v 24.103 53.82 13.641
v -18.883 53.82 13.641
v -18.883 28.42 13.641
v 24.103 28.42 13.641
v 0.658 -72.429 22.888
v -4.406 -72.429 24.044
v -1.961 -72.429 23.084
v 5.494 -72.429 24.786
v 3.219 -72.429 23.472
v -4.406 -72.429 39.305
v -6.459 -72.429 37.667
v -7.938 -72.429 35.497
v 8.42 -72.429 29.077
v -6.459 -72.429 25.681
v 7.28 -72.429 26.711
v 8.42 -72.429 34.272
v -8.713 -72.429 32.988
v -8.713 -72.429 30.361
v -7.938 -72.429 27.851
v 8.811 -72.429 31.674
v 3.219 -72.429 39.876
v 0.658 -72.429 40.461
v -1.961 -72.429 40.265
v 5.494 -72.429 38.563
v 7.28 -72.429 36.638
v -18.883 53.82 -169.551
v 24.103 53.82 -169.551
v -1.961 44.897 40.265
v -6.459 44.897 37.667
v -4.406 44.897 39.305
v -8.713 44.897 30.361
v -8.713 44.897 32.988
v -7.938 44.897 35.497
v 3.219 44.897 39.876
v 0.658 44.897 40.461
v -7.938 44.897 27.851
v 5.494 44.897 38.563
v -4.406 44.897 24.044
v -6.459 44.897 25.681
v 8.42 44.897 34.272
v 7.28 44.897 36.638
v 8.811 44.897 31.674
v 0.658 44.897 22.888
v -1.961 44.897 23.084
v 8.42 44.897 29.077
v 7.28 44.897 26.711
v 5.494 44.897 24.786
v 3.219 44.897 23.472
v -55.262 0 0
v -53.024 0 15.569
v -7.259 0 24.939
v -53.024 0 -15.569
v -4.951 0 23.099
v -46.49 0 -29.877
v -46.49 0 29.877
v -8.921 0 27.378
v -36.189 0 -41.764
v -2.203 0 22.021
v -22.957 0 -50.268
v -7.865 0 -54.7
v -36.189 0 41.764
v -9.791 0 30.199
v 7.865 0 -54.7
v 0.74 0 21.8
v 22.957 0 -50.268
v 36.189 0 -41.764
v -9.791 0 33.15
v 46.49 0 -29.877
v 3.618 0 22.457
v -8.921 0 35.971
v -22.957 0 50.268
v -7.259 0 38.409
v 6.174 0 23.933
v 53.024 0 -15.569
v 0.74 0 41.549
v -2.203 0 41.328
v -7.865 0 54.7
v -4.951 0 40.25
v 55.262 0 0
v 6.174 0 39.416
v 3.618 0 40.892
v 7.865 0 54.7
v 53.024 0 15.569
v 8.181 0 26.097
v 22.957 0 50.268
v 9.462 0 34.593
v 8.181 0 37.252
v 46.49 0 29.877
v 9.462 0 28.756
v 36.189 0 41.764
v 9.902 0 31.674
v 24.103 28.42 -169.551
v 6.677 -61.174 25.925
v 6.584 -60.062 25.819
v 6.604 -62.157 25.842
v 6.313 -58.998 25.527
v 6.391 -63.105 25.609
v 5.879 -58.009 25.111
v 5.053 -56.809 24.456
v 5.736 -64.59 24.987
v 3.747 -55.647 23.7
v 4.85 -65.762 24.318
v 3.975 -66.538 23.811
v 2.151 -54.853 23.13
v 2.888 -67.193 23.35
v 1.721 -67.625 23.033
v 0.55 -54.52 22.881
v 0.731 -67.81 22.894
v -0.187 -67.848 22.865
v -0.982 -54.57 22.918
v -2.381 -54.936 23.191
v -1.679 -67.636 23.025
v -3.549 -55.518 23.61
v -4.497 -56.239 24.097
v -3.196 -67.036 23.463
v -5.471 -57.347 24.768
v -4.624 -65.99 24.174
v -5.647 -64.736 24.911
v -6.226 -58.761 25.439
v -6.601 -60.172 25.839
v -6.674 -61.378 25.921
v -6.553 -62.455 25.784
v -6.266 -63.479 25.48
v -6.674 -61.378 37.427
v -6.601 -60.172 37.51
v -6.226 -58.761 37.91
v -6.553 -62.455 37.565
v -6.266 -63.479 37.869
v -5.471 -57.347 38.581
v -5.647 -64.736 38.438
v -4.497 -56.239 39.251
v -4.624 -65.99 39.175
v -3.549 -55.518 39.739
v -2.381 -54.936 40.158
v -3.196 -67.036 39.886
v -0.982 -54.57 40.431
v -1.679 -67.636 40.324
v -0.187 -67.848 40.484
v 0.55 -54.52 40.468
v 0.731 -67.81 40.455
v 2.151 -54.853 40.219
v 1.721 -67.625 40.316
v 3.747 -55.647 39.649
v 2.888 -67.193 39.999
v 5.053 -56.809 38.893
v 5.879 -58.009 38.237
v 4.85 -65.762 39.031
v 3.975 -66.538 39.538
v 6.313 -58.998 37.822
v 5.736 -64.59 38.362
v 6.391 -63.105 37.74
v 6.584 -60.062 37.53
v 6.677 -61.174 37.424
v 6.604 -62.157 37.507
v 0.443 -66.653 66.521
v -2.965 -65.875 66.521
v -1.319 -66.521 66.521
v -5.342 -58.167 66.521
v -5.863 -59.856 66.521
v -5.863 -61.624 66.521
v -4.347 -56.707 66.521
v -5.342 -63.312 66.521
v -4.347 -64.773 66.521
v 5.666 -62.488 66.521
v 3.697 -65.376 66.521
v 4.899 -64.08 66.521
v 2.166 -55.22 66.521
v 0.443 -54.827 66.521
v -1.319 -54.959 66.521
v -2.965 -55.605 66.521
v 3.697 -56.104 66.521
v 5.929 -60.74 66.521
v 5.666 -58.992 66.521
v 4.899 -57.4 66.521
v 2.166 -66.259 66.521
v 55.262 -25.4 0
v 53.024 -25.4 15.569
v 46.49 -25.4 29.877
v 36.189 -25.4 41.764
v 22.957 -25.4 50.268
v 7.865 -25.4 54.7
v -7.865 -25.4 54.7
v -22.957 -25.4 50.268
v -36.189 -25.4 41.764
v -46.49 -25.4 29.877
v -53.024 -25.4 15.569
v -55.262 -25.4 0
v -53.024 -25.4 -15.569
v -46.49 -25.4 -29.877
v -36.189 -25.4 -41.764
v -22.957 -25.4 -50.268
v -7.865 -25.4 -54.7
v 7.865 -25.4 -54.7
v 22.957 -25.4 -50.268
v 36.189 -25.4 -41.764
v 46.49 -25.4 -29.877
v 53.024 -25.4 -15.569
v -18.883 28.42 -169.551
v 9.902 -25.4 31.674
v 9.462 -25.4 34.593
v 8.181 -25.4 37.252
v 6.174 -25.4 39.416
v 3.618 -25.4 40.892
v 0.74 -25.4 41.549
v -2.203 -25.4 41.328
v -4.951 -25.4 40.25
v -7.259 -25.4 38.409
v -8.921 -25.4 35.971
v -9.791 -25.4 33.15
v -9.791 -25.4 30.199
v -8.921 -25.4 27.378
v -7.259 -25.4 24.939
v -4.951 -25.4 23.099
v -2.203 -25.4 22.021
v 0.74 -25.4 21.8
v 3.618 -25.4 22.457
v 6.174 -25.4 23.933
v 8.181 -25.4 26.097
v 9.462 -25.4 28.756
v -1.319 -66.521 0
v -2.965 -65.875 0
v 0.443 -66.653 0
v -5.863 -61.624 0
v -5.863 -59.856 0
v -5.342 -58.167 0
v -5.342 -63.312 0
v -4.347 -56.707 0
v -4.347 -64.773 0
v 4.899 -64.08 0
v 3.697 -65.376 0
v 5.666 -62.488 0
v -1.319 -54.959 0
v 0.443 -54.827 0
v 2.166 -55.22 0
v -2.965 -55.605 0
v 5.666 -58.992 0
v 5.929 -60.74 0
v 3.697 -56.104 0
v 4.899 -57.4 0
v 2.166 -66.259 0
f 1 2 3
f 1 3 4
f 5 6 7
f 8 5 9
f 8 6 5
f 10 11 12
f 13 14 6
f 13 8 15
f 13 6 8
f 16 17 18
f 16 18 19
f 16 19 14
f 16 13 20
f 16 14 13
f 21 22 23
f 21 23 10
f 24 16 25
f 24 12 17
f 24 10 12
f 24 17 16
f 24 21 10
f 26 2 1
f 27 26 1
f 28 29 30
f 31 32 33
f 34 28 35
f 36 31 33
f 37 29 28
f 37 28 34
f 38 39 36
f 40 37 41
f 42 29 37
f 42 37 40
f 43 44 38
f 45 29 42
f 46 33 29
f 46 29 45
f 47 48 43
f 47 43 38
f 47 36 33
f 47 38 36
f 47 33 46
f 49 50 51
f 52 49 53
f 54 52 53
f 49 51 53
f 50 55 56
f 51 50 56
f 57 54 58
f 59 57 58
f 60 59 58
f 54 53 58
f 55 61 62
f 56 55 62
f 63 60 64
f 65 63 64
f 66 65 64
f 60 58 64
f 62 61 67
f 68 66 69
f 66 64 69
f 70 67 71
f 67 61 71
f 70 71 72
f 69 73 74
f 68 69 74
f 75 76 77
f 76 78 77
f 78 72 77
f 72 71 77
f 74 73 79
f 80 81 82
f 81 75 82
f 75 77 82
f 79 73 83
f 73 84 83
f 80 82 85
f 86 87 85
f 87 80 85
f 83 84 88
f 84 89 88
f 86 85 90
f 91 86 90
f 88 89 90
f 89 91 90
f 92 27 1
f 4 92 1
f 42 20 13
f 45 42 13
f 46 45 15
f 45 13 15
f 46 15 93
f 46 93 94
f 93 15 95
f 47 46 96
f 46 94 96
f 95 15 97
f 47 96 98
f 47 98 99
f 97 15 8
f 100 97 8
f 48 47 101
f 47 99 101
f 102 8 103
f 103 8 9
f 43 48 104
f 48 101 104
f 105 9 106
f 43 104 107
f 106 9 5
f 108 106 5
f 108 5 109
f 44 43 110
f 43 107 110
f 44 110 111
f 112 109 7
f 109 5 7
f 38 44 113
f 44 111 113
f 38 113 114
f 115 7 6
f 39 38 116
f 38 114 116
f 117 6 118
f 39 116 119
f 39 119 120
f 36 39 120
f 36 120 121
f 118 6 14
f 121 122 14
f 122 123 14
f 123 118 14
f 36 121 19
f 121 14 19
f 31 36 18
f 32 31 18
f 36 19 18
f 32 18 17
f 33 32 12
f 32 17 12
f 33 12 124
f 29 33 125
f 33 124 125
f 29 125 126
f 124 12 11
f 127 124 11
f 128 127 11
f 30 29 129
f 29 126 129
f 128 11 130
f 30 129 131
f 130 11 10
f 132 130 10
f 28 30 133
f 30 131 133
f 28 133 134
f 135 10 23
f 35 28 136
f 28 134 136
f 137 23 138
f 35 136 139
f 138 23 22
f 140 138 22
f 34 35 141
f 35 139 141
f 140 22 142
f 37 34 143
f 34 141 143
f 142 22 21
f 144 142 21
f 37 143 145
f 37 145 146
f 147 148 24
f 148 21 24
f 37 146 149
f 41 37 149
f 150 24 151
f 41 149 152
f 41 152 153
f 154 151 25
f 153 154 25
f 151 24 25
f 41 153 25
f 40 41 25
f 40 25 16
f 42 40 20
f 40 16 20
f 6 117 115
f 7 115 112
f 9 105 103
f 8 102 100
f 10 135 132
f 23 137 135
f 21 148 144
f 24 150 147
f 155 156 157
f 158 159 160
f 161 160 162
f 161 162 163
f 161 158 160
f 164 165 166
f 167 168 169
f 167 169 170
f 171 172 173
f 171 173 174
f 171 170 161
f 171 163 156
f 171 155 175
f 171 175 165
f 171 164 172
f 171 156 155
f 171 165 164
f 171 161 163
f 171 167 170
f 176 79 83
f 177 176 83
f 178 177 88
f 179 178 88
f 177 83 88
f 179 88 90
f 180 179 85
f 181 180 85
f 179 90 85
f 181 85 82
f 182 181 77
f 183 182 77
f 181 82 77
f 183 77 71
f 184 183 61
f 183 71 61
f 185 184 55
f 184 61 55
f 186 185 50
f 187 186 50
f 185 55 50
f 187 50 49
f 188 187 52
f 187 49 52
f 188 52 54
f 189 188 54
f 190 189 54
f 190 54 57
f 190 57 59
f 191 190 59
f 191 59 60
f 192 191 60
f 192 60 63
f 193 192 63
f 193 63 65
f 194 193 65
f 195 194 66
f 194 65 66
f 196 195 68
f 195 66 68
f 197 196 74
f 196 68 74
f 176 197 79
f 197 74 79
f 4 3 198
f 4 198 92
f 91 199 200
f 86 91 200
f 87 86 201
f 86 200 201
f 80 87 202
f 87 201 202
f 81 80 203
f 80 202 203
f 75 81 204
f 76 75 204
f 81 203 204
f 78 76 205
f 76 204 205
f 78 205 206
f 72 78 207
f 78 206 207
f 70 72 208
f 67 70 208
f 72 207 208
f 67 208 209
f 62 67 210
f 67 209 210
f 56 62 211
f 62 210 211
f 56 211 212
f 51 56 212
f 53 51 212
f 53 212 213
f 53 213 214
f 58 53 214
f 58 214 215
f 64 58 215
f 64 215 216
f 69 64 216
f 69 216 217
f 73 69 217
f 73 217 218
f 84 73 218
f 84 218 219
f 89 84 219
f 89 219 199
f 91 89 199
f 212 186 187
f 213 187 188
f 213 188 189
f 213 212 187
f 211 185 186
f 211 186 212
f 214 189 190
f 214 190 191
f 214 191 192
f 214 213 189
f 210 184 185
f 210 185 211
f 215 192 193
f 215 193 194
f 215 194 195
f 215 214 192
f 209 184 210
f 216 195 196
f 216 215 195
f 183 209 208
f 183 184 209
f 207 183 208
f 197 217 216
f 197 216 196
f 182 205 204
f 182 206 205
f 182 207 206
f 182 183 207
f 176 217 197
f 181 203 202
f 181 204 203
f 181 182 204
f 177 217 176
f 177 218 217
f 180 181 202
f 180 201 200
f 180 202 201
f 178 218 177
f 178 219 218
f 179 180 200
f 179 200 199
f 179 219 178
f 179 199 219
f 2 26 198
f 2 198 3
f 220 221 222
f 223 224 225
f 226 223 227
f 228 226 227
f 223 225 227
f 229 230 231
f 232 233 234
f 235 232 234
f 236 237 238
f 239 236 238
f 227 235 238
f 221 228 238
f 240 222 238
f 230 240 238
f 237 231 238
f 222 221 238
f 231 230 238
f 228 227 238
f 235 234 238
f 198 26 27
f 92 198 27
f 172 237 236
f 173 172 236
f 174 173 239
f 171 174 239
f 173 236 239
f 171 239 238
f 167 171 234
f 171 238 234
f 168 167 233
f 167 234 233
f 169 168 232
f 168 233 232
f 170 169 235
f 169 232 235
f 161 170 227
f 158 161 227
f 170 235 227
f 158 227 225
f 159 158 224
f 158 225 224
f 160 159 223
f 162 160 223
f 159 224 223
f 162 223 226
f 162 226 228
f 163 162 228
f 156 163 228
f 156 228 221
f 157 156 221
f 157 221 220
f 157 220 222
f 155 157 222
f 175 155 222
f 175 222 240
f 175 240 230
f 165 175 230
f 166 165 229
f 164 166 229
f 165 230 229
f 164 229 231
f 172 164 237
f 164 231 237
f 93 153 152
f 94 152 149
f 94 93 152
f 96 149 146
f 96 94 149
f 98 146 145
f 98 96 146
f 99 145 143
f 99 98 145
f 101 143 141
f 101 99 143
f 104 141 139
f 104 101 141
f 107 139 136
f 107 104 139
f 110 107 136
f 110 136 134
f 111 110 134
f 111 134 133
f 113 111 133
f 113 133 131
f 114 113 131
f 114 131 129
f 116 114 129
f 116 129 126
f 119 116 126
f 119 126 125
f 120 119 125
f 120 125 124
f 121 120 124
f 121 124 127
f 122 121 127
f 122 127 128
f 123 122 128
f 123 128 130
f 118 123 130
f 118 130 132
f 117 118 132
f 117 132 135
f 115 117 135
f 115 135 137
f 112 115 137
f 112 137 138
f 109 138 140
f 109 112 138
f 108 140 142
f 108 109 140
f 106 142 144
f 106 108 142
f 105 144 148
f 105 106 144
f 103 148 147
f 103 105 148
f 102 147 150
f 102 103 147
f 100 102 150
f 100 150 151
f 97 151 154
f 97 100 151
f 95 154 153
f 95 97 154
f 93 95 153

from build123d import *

# Parameters (mm, degrees)
F0_R      = 55.26233
F1_DEPTH  = 25.4
F2_R      = 9.901823
F3_DEPTH  = 116.448866
F4_R      = 8.811033
F5_DEPTH  = 47.02949
F5_FACE_R = 8.811033
F6_DEPTH  = 70.296958
F8_R      = 6.676782
F9_DEPTH  = 74.20806
F10_R     = 5.929413
F11_DEPTH = 66.520611
F13_W     = 42.985498
F13_H     = 183.192238
F14_DEPTH = 25.4


with BuildPart() as f1:
    # F0 (on Front) → F1 (new body)
    with BuildSketch(Plane.XZ):
        Circle(F0_R)
    extrude(amount=F1_DEPTH)

    # F2 (on face) → F3 (cut)
    with BuildSketch(Plane.XZ.offset(25.4)):
        with Locations((0, 31.674445)):
            Circle(F2_R)
    extrude(amount=-F3_DEPTH, mode=Mode.SUBTRACT)


with BuildPart() as f5:
    # F4 (on face) → F5 (new body)
    with BuildSketch(Plane.XZ.offset(25.4)):
        with Locations((0, 31.674445)):
            Circle(F4_R)
    extrude(amount=F5_DEPTH)

    # F5_face (on face) → F6 (join)
    with BuildSketch(Plane(origin=(0, -25.4, 31.674445), x_dir=(1, 0, 0), z_dir=(0, 1, 0))):
        Circle(F5_FACE_R)
    extrude(amount=F6_DEPTH)

    # F8 (on Top) → F9 (cut)
    with BuildSketch(Plane.XY):
        with Locations((0, -61.173689)):
            Circle(F8_R)
    extrude(amount=F9_DEPTH, mode=Mode.SUBTRACT)


with BuildPart() as f11:
    # F10 (on Top) → F11 (new body)
    with BuildSketch(Plane.XY):
        with Locations((0, -60.739782)):
            Circle(F10_R)
    extrude(amount=F11_DEPTH)


with BuildPart() as f14:
    # F13 (on plane+point) → F14 (new body)
    with BuildSketch(Plane.XZ.offset(-53.819593)):
        with Locations((2.609998, -77.955134)):
            Rectangle(F13_W, F13_H)
    extrude(amount=F14_DEPTH)


solid = Compound([f1.part, f5.part, f11.part, f14.part])
